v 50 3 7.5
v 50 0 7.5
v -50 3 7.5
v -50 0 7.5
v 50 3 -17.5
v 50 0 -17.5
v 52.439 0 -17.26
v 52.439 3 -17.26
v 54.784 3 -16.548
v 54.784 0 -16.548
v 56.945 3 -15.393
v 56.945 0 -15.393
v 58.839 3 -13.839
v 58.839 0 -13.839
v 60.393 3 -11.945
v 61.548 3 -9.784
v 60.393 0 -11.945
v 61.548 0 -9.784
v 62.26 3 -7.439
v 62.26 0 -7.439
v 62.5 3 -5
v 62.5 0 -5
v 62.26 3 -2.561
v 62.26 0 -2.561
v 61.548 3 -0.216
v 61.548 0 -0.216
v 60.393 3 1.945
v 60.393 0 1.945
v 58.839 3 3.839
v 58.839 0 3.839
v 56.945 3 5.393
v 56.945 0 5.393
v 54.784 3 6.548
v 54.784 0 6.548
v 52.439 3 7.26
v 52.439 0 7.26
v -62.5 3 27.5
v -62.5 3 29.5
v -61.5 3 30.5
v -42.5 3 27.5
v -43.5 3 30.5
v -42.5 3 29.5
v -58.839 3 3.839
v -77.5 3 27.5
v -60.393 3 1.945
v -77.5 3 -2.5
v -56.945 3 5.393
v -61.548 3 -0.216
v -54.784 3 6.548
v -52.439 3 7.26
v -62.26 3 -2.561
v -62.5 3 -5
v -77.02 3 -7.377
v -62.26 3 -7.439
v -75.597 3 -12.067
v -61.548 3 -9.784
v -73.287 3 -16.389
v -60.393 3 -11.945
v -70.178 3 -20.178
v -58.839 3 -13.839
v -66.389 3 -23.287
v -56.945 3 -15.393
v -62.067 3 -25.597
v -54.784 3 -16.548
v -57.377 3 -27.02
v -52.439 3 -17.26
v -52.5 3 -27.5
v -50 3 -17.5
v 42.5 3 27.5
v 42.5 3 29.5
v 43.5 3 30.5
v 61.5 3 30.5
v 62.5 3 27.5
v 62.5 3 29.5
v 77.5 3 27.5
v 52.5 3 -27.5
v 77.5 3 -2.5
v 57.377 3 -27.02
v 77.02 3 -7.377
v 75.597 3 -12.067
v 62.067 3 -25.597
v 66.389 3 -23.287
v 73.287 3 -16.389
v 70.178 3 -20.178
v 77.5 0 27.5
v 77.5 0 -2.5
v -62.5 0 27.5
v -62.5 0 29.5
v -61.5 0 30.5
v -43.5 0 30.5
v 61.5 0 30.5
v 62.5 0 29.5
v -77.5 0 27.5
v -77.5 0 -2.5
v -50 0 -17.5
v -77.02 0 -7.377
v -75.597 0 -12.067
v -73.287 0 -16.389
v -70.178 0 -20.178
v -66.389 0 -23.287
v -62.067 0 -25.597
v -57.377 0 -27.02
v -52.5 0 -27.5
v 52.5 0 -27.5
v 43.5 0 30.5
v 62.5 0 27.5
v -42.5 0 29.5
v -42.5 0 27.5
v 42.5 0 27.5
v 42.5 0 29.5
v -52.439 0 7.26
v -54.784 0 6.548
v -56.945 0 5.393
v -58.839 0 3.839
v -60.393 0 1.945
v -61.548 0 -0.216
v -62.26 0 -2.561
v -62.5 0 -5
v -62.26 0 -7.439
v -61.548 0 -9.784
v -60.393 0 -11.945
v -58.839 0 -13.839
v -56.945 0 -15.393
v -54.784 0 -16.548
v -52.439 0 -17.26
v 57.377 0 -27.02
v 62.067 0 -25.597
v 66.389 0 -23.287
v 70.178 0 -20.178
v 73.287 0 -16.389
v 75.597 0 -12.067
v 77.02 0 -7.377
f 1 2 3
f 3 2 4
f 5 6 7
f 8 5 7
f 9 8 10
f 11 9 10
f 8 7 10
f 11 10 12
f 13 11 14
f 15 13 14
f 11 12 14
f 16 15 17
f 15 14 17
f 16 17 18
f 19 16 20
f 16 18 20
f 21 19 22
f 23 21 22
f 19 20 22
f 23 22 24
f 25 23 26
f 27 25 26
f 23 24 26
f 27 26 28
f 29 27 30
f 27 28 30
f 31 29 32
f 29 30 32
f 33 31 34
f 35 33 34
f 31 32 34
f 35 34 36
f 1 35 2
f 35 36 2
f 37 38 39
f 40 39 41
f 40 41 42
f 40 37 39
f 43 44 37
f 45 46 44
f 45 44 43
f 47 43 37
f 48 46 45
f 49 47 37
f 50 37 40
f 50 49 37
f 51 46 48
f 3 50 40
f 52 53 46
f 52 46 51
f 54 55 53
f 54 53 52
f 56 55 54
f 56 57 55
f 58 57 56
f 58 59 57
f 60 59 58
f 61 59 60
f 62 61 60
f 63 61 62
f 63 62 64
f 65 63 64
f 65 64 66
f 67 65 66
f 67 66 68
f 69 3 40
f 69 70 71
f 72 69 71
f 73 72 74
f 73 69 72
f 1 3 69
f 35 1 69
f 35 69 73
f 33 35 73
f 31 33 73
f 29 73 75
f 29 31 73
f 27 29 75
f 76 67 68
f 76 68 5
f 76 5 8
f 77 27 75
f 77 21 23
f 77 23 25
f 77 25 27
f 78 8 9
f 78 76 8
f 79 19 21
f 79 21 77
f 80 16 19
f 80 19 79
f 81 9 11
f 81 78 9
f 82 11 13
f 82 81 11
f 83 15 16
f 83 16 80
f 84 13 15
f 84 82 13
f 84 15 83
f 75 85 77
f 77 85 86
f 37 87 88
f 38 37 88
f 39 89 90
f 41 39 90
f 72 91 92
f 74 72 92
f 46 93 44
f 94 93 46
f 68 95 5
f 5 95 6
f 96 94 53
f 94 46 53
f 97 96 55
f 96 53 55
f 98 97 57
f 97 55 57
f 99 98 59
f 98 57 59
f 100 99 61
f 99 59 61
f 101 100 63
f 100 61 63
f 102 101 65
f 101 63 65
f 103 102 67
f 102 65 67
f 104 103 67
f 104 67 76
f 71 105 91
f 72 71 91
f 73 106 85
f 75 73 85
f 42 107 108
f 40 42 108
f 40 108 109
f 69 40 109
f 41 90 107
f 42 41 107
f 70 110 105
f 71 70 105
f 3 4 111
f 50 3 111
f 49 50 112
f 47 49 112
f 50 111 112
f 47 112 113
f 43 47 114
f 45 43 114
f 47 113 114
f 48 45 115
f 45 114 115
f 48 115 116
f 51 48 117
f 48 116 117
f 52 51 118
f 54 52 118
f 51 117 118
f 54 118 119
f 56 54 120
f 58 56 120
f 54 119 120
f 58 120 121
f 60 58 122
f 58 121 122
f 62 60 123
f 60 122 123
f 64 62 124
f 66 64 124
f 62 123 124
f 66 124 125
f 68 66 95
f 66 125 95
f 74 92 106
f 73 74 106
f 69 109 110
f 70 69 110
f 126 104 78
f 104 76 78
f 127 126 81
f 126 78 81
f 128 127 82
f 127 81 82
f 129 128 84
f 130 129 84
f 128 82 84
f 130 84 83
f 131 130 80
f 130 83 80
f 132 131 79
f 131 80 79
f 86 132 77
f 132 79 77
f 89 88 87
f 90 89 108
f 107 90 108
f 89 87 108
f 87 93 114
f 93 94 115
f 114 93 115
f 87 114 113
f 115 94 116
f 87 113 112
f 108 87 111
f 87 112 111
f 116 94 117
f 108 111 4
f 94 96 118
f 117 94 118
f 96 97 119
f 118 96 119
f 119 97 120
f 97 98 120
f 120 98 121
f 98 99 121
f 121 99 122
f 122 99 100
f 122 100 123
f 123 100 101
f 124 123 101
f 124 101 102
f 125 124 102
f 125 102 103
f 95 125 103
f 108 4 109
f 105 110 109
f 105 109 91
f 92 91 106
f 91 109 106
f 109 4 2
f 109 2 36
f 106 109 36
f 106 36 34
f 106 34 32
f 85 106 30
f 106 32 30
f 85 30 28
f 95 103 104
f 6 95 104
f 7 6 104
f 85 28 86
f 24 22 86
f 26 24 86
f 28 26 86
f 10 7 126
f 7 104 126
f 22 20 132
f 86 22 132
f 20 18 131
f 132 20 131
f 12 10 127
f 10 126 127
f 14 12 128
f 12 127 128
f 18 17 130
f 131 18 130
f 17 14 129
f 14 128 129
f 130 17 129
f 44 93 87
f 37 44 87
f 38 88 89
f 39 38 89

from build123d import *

# Parameters (mm, degrees)
SKETCH1_W               = 155
SKETCH1_H               = 55
EXTRUDE1_DEPTH          = 3
FILLET1_R               = 25
TAB_AND_SLOT_TAB1_DEPTH = 3


# Read off the part's stored shape, not the designer's step: Tab and Slot-Tab1
with BuildPart() as part:
    # Sketch1 → Extrude1 (new body)
    with BuildSketch(Plane(origin=(0, 0, 0), x_dir=(1, 0, 0), z_dir=(0, 1, 0))):
        Rectangle(SKETCH1_W, SKETCH1_H)
        with BuildLine():
            Line((-50, 17.5), (50, 17.5))
            ThreePointArc((50, 17.5), (62.5, 5), (50, -7.5))
            Line((50, -7.5), (-50, -7.5))
            ThreePointArc((-50, -7.5), (-62.5, 5), (-50, 17.5))
        make_face(mode=Mode.SUBTRACT)
    extrude(amount=EXTRUDE1_DEPTH)

    # Fillet1
    fillet1_edges = [part.edges().sort_by_distance(p)[0] for p in [
        (-77.5, 1.5, -27.5),
        (77.5, 1.5, -27.5),
    ]]
    fillet(fillet1_edges, radius=FILLET1_R)

    # Tab and Slot-Tab1 outline → Tab and Slot-Tab1 (add)
    with BuildSketch(Plane(origin=(0, 0, 0), x_dir=(1, 0, 0), z_dir=(0, 1, 0))):
        Polygon((62.5, -27.5), (42.5, -27.5), (42.5, -29.5), (43.5, -30.5), (61.5, -30.5), (62.5, -29.5), align=None)
        Polygon((-42.5, -29.5), (-42.5, -27.5), (-62.5, -27.5), (-62.5, -29.5), (-61.5, -30.5), (-43.5, -30.5), align=None)
    extrude(amount=TAB_AND_SLOT_TAB1_DEPTH)


solid = part.part
